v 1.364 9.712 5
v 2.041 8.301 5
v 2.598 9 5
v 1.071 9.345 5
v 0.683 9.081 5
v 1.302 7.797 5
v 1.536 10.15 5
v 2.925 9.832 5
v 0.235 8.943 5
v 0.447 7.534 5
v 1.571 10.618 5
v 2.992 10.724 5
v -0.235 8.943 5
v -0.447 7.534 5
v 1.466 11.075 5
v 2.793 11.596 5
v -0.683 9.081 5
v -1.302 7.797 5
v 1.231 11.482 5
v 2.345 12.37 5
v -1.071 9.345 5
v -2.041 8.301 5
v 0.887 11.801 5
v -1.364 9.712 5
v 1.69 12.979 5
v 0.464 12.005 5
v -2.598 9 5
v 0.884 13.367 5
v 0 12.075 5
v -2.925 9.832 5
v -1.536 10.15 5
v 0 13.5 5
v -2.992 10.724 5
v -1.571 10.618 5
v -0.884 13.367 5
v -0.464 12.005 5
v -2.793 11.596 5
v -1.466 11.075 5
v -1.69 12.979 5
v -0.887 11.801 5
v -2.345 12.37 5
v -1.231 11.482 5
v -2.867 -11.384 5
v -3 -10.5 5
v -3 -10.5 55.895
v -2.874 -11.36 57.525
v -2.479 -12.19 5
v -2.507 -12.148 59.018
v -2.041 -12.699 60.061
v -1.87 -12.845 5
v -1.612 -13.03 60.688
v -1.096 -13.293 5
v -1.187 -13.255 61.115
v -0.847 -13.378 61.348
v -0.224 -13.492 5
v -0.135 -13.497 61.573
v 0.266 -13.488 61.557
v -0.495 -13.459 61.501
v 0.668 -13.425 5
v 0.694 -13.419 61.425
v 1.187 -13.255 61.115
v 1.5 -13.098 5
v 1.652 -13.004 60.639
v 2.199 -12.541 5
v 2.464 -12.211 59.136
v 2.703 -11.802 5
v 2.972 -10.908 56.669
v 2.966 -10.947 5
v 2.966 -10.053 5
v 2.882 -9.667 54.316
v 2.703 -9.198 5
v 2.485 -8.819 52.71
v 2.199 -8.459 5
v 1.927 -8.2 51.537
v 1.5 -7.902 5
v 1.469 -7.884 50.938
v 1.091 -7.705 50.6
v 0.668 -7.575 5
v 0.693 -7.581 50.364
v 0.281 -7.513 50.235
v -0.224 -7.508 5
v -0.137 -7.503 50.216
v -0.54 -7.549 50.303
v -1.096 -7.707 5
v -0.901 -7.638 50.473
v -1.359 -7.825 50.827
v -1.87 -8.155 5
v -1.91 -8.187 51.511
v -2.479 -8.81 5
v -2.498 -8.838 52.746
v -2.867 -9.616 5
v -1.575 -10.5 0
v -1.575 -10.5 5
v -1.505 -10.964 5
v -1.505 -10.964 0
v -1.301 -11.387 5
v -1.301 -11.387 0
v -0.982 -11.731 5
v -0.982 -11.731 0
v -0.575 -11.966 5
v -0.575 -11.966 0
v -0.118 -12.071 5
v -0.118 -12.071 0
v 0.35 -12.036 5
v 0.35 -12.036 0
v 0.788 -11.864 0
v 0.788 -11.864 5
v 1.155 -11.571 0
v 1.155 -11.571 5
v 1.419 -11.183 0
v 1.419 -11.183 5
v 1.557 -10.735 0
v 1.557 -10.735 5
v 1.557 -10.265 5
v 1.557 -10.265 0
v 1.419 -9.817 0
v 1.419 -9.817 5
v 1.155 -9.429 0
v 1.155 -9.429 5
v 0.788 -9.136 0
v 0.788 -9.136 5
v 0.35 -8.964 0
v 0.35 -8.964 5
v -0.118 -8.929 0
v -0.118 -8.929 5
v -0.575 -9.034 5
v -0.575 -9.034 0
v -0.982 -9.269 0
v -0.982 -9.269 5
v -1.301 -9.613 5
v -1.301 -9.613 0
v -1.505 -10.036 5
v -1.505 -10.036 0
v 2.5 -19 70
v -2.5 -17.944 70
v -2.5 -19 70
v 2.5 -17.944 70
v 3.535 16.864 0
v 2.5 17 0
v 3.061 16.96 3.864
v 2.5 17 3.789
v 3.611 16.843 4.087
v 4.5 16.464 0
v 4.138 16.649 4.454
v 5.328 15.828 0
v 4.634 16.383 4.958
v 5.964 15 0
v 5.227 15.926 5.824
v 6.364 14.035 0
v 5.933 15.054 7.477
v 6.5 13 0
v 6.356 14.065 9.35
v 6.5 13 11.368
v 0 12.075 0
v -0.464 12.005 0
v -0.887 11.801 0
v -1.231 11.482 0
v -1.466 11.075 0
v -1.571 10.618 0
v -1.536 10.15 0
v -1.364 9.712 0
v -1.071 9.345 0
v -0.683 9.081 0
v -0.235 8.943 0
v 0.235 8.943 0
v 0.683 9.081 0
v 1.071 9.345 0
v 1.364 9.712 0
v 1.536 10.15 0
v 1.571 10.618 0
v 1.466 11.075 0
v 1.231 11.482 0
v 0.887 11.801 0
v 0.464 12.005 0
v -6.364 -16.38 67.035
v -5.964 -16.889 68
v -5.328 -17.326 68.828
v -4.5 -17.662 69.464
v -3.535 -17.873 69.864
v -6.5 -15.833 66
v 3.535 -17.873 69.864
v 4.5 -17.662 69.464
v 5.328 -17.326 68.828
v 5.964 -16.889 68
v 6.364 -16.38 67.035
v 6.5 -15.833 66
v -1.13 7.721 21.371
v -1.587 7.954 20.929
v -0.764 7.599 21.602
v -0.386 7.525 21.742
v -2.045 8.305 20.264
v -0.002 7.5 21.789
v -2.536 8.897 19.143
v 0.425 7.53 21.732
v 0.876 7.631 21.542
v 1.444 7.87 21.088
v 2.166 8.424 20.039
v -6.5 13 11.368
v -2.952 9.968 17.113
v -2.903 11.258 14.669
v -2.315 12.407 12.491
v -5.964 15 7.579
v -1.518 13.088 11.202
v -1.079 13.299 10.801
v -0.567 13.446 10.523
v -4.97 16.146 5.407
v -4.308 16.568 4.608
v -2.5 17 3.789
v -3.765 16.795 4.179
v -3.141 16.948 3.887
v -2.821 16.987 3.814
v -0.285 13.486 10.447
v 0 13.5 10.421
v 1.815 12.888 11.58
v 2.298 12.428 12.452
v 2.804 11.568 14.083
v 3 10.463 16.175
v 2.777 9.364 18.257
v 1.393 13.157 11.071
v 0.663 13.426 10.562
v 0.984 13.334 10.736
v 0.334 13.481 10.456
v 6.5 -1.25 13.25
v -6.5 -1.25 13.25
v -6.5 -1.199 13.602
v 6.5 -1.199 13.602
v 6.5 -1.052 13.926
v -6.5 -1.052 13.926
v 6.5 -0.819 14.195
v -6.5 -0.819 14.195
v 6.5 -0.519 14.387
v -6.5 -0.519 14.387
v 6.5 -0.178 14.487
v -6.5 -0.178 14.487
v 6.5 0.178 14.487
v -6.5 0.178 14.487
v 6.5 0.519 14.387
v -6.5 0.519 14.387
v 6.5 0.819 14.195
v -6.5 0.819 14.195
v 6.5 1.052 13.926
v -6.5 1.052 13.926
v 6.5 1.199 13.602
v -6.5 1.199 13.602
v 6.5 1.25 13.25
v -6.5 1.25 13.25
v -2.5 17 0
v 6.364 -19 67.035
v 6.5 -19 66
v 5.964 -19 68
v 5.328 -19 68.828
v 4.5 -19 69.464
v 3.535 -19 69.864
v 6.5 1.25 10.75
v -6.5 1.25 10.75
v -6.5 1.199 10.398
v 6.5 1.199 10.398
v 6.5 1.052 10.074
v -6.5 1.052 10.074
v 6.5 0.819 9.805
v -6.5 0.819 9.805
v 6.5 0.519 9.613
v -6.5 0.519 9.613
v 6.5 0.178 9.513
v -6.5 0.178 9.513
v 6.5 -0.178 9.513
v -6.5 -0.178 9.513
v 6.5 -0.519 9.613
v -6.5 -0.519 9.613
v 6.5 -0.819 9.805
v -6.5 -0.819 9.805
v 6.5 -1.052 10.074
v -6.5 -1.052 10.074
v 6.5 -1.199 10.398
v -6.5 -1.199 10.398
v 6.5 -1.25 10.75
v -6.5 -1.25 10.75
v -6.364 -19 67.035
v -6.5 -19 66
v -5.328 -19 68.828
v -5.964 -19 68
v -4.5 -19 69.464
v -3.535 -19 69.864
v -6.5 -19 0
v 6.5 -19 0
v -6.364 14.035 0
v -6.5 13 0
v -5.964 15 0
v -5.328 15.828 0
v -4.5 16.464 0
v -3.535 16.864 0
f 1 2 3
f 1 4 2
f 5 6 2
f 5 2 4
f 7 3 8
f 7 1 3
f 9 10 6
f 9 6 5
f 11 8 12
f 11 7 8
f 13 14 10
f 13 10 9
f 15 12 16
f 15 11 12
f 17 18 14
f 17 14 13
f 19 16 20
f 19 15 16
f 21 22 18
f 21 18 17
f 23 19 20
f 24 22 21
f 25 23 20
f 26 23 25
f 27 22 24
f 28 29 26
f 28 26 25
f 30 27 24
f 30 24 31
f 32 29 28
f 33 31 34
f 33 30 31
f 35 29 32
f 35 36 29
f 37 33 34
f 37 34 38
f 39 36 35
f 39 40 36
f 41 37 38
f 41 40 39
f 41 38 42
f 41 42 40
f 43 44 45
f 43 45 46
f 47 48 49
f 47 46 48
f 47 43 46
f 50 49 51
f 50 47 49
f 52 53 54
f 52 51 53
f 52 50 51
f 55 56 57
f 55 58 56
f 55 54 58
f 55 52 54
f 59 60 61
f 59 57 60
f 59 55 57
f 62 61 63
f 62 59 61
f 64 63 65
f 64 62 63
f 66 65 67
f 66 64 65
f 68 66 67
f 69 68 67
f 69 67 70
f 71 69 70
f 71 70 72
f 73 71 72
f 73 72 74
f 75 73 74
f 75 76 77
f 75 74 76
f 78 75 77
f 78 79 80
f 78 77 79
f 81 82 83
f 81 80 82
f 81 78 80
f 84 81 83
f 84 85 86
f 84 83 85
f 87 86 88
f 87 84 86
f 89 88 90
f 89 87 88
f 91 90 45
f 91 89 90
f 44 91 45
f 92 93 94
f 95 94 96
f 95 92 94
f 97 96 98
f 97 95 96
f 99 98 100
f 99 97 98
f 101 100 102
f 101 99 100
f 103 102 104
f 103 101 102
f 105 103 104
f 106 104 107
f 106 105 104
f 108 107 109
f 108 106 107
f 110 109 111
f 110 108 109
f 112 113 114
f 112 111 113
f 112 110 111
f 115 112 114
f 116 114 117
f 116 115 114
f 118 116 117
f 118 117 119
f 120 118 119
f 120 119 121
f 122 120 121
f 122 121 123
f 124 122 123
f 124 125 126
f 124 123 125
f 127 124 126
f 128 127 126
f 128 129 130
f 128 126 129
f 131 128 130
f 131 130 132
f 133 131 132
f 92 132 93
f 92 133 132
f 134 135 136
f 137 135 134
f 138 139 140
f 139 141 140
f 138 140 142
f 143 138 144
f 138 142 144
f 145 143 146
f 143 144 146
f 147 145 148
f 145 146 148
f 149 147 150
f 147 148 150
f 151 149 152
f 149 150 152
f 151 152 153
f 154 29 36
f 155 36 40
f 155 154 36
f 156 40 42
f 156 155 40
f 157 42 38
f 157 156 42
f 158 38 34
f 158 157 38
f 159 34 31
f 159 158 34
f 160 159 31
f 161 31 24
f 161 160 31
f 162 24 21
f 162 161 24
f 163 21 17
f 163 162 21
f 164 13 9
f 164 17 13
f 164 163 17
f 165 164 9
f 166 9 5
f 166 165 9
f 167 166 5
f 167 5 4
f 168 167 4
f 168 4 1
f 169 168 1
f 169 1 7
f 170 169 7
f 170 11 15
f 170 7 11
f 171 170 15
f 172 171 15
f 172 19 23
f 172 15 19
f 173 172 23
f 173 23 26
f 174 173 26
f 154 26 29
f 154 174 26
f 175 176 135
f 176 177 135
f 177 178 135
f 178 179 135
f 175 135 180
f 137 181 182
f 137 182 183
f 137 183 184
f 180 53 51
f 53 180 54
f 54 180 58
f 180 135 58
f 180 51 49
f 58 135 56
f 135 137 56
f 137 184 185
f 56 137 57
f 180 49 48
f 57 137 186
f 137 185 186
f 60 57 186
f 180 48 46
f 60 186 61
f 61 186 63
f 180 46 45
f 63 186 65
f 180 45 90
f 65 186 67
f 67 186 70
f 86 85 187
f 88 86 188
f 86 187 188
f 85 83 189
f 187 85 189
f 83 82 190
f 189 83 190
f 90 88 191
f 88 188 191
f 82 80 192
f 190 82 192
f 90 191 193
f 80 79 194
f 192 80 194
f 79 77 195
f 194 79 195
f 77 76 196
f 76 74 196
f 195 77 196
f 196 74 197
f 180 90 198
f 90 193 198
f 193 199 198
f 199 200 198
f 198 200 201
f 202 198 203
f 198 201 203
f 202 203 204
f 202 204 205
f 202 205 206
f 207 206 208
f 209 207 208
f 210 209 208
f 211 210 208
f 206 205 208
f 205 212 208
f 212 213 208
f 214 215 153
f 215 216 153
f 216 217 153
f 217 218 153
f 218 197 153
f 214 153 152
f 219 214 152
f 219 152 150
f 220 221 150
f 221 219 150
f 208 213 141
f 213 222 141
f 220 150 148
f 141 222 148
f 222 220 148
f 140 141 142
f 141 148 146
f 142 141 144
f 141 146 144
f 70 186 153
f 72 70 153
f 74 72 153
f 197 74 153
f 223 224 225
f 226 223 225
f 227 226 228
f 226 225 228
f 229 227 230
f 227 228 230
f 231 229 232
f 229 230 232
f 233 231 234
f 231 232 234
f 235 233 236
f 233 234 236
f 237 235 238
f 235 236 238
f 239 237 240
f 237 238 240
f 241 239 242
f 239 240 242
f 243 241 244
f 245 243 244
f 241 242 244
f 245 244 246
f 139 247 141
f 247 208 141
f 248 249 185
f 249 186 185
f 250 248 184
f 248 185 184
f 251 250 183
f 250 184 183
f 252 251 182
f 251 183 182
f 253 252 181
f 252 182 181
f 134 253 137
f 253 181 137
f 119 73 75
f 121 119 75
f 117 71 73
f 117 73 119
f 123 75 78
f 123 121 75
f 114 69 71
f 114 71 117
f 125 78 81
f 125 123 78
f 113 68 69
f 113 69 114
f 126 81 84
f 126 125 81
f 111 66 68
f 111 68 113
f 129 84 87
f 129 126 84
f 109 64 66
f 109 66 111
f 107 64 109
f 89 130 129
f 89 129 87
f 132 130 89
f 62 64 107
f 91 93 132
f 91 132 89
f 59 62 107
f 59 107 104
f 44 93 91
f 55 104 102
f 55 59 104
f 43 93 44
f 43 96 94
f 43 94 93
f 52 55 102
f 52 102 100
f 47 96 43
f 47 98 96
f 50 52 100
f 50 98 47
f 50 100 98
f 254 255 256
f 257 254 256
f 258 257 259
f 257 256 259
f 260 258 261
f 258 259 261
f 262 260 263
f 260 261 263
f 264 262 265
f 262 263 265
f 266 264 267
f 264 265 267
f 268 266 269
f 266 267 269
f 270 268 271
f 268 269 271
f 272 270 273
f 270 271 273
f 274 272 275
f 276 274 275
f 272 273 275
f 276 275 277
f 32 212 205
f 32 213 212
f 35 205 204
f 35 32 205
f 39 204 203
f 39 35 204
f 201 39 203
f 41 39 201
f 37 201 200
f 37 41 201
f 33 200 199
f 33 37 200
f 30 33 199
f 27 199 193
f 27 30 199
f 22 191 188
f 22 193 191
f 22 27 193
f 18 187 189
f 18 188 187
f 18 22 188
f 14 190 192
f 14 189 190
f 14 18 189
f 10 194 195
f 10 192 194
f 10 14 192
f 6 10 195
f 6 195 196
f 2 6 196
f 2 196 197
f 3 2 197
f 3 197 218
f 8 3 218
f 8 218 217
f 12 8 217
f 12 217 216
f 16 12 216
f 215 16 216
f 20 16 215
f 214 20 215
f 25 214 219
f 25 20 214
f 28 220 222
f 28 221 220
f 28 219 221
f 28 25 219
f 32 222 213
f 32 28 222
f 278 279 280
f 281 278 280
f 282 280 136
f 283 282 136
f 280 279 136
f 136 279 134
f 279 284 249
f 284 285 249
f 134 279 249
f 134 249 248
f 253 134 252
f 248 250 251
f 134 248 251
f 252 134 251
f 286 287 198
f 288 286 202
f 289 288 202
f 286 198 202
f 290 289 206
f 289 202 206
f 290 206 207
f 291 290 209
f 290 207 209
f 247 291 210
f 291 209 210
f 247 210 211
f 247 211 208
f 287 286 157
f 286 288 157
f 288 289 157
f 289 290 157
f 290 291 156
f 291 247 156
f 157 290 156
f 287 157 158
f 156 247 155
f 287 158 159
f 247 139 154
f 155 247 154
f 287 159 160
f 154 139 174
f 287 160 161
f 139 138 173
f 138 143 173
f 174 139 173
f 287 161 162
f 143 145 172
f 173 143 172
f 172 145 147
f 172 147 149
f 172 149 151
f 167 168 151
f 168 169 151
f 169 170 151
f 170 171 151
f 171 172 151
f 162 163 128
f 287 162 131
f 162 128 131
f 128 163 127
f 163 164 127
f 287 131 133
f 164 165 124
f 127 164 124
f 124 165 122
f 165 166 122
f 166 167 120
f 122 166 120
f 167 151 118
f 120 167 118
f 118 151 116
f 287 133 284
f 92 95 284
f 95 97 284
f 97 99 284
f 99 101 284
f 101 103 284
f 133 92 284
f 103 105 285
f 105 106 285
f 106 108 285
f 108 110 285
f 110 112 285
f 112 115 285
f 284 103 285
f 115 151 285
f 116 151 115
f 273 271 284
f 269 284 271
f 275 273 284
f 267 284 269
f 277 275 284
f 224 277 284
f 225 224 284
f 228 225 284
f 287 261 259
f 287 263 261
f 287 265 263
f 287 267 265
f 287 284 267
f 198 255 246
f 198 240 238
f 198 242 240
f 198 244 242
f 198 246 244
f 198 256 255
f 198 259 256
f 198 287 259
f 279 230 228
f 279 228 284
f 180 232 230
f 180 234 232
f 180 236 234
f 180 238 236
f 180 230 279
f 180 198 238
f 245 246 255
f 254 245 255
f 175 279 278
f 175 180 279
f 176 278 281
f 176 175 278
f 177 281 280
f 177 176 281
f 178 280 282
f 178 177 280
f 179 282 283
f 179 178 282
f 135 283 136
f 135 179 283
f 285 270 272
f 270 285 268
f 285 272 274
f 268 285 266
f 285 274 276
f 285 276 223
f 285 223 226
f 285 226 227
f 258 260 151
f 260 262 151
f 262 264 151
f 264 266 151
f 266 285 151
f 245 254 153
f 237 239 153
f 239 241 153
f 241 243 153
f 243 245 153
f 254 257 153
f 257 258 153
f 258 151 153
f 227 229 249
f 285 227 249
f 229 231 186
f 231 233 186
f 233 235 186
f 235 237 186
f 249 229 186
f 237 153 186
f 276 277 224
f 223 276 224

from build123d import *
from OCP.BRepFilletAPI import BRepFilletAPI_MakeChamfer

# Parameters (mm, degrees)
BOSS_EXTRUDE1_DEPTH     = 6.5
SKETCH2_R               = 1.575
CUT_EXTRUDE1_DEPTH      = 75.74790967
CUT_EXTRUDE2_START      = 5
SKETCH2_3_R             = 3
CUT_EXTRUDE2_DEPTH      = 70.74790967
CUT_EXTRUDE3_DEPTH      = 75.74790967
CUT_EXTRUDE3_DEPTH_BACK = 75.74790967
CHAMFER1_SIZE           = 2
CHAMFER1_SIZE2          = 2.26145916
CHAMFER1_SIZE2_2        = 4.284869987
FILLET2_R               = 4


with BuildPart() as part:
    # Sketch1 → Boss-Extrude1 (new, symmetric)
    with BuildSketch(Plane(origin=(0, 0, 0), x_dir=(0, 0, -1), z_dir=(1, 0, 0))):
        Polygon((0, 19), (0, -19), (-72, -19), align=None)
    extrude(amount=BOSS_EXTRUDE1_DEPTH, both=True)

    # Sketch2 → Cut-Extrude1 (cut, through all)
    with BuildSketch(Plane.XY):
        with Locations((0, 10.5)):
            Circle(SKETCH2_R)
        with Locations((0, -10.5)):
            Circle(SKETCH2_R)
    extrude(amount=CUT_EXTRUDE1_DEPTH, mode=Mode.SUBTRACT)

    # Sketch2<3> → Cut-Extrude2 (cut, through all)
    with BuildSketch(Plane.XY.offset(CUT_EXTRUDE2_START)):
        with Locations((0, 10.5)):
            Circle(SKETCH2_3_R)
        with Locations((0, -10.5)):
            Circle(SKETCH2_3_R)
    extrude(amount=CUT_EXTRUDE2_DEPTH, mode=Mode.SUBTRACT)

    # Sketch5 → Cut-Extrude3 (cut, two sides: drawn at the far end of the back side and taken through both)
    with BuildSketch(Plane(origin=(0, 0, 0), x_dir=(0, 0, -1), z_dir=(1, 0, 0)).offset(-CUT_EXTRUDE3_DEPTH_BACK)):
        with BuildLine():
            Line((-13.25, 1.25), (-10.75, 1.25))
            ThreePointArc((-10.75, 1.25), (-9.5, 0), (-10.75, -1.25))
            Line((-10.75, -1.25), (-13.25, -1.25))
            ThreePointArc((-13.25, -1.25), (-14.5, 0), (-13.25, 1.25))
        make_face()
    extrude(amount=CUT_EXTRUDE3_DEPTH + CUT_EXTRUDE3_DEPTH_BACK, mode=Mode.SUBTRACT)

    # Chamfer1: one chamfer whose edges measure the first distance from different faces: ONE call of the kernel's chamfer builder (chamfer() names one face for all edges)
    chamfer1_edges_1 = [part.edges().sort_by_distance(p)[0] for p in [
        (0, -19, 72),
    ]]
    chamfer1_side_1 = [part.faces().sort_by_distance(p)[0] for p in [
        (0, -19, 36),
    ]]
    chamfer1_edges_2 = [part.edges().sort_by_distance(p)[0] for p in [
        (0, 19, 0),
    ]]
    chamfer1_side_2 = [part.faces().sort_by_distance(p)[0] for p in [
        (0, 0, 0),
    ]]
    chamfer1 = BRepFilletAPI_MakeChamfer(part.part.solid().wrapped)
    for e in chamfer1_edges_1:
        chamfer1.Add(CHAMFER1_SIZE, CHAMFER1_SIZE2, e.wrapped, chamfer1_side_1[0].wrapped)  # the first distance lies on this face
    for e in chamfer1_edges_2:
        chamfer1.Add(CHAMFER1_SIZE, CHAMFER1_SIZE2_2, e.wrapped, chamfer1_side_2[0].wrapped)  # the first distance lies on this face
    add(Compound.cast(chamfer1.Shape()), mode=Mode.REPLACE)

    # Fillet2
    fillet2_edges = [part.edges().sort_by_distance(p)[0] for p in [
        (-6.5, 17, 1.894736842),
        (6.5, 17, 1.894736842),
        (6.5, -18.472222222, 70),
        (-6.5, -18.472222222, 70),
    ]]
    fillet(fillet2_edges, radius=FILLET2_R)


solid = part.part
